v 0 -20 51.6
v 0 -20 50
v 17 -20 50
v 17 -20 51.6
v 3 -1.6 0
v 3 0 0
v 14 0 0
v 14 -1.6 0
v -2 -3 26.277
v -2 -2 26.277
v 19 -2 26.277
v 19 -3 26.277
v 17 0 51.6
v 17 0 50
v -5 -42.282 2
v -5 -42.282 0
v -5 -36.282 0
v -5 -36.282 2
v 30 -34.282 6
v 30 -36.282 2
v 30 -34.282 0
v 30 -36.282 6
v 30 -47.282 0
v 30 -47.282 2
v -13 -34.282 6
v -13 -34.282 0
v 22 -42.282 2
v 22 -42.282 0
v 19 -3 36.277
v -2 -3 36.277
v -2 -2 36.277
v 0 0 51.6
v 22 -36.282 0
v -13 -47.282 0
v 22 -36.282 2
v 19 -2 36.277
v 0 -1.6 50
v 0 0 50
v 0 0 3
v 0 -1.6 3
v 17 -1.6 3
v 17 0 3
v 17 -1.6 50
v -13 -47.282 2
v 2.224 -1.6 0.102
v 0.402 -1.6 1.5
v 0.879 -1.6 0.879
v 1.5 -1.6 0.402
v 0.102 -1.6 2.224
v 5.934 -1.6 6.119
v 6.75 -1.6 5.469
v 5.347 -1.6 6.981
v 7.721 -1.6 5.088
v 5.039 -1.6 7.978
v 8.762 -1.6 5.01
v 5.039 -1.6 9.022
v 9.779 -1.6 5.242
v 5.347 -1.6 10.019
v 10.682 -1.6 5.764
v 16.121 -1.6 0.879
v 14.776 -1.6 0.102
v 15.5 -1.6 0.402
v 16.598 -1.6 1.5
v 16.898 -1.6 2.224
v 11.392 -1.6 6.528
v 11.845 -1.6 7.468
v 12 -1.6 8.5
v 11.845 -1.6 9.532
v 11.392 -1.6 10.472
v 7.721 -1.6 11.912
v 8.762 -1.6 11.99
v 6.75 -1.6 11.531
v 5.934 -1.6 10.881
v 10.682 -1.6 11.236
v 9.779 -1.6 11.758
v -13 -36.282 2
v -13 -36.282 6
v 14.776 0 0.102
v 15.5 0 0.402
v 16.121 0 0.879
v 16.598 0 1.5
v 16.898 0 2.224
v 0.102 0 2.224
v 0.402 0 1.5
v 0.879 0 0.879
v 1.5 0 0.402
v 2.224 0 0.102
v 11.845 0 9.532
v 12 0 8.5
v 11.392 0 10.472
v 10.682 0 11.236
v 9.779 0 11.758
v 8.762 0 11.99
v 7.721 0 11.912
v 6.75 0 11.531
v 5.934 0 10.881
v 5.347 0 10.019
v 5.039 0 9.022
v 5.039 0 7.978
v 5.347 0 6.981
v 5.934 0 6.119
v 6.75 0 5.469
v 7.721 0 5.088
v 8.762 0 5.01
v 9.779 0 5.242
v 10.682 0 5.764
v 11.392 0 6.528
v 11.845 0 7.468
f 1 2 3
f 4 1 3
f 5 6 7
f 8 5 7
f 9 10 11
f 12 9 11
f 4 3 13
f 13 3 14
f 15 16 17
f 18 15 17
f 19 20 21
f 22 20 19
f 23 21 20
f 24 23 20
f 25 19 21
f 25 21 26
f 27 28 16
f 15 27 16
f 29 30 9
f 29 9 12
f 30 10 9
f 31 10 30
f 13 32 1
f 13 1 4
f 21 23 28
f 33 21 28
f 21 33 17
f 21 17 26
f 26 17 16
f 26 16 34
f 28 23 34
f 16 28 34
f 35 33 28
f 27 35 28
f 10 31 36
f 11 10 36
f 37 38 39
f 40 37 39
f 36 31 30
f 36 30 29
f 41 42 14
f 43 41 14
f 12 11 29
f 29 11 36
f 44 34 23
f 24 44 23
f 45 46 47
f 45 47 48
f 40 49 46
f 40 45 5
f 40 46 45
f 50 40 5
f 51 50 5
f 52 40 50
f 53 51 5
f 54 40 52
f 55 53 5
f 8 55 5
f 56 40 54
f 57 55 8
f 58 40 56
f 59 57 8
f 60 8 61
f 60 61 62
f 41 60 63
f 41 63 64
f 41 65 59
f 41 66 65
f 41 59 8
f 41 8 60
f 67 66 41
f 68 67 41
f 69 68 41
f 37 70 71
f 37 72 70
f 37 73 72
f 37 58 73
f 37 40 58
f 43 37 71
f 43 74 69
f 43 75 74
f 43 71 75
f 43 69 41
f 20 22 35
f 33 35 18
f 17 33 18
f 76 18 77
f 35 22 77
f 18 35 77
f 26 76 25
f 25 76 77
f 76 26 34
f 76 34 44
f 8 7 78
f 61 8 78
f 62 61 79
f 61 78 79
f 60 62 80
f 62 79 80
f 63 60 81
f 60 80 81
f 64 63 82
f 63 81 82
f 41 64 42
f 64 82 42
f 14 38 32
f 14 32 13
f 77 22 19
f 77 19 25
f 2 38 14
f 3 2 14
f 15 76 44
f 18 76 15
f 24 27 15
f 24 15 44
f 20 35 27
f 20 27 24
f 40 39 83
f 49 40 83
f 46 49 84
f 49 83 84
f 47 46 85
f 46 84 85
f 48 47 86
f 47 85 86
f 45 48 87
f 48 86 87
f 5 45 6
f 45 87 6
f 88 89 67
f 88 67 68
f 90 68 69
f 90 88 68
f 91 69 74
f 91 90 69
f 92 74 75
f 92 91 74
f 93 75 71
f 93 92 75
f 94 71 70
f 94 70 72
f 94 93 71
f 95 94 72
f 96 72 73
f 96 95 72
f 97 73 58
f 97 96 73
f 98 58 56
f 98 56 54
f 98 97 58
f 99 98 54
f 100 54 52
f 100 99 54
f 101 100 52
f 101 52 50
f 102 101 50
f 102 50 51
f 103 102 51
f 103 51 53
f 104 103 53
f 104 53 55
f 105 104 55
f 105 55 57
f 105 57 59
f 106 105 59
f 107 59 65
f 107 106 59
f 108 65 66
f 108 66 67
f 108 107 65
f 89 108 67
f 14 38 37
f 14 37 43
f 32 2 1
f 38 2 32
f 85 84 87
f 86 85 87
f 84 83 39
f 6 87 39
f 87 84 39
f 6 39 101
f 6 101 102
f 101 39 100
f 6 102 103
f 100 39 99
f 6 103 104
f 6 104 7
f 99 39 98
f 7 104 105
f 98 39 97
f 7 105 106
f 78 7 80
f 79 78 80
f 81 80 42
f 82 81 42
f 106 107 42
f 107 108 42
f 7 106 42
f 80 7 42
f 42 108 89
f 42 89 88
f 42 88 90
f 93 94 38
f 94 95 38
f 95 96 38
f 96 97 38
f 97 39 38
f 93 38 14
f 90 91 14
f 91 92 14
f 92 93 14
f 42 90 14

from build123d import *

# Parameters (mm, degrees)
F8_DEPTH  = 2
F7_W      = 43
F7_H      = 6
F9_DEPTH  = 2
F2_R      = 3.5
F2_W      = 17
F2_H      = 5
F2_H_2    = 28
F10_DEPTH = 1.6
F4_W      = 17
F4_H      = 20
F11_DEPTH = 1.6
F1_W      = 21
F1_H      = 10
F12_DEPTH = 1


# Not quite as in the source:
# - a feature names something its author has since deleted; it is built from what else it names


with BuildPart() as f8:
    # F5 (on Top) → F8 (new body)
    with BuildSketch(Plane.XY):
        Polygon((-5, -36.2816824913), (-13, -36.2816824913), (-13, -47.2816824913), (30, -47.2816824913), (30, -36.2816824913), (22, -36.2816824913), (22, -42.2816824913), (-5, -42.2816824913), align=None)
    extrude(amount=F8_DEPTH)

    # F7 (on line) → F9 (join)
    with BuildSketch(Plane(origin=(0, -36.2816824913, 0), x_dir=(-1, 0, 0), z_dir=(0, 1, 0))):
        with Locations((-8.5, 3)):
            Rectangle(F7_W, F7_H)
    extrude(amount=F9_DEPTH)


with BuildPart() as f10:
    # F2 (on Front) → F10 (new body)
    with BuildSketch(Plane.XZ):
        with BuildLine():
            Line((17, 17), (0, 17))
            Line((0, 17), (0, 3))
            ThreePointArc((0, 3), (0.8786796564, 0.8786796564), (3, 0))
            Line((3, 0), (14, 0))
            ThreePointArc((14, 0), (16.1213203436, 0.8786796564), (17, 3))
            Line((17, 3), (17, 17))
        make_face()
        with Locations((8.5, 8.5)):
            Circle(F2_R, mode=Mode.SUBTRACT)
        with Locations((8.5, 19.5)):
            Rectangle(F2_W, F2_H)
        with Locations((8.5, 36)):
            Rectangle(F2_W, F2_H_2)
    extrude(amount=F10_DEPTH)


with BuildPart() as f11:
    # F4 (on line) → F11 (new body)
    with BuildSketch(Plane.XY.offset(50)):
        with Locations((8.5, -10)):
            Rectangle(F4_W, F4_H)
    extrude(amount=F11_DEPTH)


with BuildPart() as f12:
    # F1 (on offset) → F12 (new body)
    with BuildSketch(Plane.XZ.offset(2)):
        with Locations((8.5, 31.2774626663)):
            Rectangle(F1_W, F1_H)
    extrude(amount=F12_DEPTH)


solid = Compound([f8.part, f10.part, f11.part, f12.part])
